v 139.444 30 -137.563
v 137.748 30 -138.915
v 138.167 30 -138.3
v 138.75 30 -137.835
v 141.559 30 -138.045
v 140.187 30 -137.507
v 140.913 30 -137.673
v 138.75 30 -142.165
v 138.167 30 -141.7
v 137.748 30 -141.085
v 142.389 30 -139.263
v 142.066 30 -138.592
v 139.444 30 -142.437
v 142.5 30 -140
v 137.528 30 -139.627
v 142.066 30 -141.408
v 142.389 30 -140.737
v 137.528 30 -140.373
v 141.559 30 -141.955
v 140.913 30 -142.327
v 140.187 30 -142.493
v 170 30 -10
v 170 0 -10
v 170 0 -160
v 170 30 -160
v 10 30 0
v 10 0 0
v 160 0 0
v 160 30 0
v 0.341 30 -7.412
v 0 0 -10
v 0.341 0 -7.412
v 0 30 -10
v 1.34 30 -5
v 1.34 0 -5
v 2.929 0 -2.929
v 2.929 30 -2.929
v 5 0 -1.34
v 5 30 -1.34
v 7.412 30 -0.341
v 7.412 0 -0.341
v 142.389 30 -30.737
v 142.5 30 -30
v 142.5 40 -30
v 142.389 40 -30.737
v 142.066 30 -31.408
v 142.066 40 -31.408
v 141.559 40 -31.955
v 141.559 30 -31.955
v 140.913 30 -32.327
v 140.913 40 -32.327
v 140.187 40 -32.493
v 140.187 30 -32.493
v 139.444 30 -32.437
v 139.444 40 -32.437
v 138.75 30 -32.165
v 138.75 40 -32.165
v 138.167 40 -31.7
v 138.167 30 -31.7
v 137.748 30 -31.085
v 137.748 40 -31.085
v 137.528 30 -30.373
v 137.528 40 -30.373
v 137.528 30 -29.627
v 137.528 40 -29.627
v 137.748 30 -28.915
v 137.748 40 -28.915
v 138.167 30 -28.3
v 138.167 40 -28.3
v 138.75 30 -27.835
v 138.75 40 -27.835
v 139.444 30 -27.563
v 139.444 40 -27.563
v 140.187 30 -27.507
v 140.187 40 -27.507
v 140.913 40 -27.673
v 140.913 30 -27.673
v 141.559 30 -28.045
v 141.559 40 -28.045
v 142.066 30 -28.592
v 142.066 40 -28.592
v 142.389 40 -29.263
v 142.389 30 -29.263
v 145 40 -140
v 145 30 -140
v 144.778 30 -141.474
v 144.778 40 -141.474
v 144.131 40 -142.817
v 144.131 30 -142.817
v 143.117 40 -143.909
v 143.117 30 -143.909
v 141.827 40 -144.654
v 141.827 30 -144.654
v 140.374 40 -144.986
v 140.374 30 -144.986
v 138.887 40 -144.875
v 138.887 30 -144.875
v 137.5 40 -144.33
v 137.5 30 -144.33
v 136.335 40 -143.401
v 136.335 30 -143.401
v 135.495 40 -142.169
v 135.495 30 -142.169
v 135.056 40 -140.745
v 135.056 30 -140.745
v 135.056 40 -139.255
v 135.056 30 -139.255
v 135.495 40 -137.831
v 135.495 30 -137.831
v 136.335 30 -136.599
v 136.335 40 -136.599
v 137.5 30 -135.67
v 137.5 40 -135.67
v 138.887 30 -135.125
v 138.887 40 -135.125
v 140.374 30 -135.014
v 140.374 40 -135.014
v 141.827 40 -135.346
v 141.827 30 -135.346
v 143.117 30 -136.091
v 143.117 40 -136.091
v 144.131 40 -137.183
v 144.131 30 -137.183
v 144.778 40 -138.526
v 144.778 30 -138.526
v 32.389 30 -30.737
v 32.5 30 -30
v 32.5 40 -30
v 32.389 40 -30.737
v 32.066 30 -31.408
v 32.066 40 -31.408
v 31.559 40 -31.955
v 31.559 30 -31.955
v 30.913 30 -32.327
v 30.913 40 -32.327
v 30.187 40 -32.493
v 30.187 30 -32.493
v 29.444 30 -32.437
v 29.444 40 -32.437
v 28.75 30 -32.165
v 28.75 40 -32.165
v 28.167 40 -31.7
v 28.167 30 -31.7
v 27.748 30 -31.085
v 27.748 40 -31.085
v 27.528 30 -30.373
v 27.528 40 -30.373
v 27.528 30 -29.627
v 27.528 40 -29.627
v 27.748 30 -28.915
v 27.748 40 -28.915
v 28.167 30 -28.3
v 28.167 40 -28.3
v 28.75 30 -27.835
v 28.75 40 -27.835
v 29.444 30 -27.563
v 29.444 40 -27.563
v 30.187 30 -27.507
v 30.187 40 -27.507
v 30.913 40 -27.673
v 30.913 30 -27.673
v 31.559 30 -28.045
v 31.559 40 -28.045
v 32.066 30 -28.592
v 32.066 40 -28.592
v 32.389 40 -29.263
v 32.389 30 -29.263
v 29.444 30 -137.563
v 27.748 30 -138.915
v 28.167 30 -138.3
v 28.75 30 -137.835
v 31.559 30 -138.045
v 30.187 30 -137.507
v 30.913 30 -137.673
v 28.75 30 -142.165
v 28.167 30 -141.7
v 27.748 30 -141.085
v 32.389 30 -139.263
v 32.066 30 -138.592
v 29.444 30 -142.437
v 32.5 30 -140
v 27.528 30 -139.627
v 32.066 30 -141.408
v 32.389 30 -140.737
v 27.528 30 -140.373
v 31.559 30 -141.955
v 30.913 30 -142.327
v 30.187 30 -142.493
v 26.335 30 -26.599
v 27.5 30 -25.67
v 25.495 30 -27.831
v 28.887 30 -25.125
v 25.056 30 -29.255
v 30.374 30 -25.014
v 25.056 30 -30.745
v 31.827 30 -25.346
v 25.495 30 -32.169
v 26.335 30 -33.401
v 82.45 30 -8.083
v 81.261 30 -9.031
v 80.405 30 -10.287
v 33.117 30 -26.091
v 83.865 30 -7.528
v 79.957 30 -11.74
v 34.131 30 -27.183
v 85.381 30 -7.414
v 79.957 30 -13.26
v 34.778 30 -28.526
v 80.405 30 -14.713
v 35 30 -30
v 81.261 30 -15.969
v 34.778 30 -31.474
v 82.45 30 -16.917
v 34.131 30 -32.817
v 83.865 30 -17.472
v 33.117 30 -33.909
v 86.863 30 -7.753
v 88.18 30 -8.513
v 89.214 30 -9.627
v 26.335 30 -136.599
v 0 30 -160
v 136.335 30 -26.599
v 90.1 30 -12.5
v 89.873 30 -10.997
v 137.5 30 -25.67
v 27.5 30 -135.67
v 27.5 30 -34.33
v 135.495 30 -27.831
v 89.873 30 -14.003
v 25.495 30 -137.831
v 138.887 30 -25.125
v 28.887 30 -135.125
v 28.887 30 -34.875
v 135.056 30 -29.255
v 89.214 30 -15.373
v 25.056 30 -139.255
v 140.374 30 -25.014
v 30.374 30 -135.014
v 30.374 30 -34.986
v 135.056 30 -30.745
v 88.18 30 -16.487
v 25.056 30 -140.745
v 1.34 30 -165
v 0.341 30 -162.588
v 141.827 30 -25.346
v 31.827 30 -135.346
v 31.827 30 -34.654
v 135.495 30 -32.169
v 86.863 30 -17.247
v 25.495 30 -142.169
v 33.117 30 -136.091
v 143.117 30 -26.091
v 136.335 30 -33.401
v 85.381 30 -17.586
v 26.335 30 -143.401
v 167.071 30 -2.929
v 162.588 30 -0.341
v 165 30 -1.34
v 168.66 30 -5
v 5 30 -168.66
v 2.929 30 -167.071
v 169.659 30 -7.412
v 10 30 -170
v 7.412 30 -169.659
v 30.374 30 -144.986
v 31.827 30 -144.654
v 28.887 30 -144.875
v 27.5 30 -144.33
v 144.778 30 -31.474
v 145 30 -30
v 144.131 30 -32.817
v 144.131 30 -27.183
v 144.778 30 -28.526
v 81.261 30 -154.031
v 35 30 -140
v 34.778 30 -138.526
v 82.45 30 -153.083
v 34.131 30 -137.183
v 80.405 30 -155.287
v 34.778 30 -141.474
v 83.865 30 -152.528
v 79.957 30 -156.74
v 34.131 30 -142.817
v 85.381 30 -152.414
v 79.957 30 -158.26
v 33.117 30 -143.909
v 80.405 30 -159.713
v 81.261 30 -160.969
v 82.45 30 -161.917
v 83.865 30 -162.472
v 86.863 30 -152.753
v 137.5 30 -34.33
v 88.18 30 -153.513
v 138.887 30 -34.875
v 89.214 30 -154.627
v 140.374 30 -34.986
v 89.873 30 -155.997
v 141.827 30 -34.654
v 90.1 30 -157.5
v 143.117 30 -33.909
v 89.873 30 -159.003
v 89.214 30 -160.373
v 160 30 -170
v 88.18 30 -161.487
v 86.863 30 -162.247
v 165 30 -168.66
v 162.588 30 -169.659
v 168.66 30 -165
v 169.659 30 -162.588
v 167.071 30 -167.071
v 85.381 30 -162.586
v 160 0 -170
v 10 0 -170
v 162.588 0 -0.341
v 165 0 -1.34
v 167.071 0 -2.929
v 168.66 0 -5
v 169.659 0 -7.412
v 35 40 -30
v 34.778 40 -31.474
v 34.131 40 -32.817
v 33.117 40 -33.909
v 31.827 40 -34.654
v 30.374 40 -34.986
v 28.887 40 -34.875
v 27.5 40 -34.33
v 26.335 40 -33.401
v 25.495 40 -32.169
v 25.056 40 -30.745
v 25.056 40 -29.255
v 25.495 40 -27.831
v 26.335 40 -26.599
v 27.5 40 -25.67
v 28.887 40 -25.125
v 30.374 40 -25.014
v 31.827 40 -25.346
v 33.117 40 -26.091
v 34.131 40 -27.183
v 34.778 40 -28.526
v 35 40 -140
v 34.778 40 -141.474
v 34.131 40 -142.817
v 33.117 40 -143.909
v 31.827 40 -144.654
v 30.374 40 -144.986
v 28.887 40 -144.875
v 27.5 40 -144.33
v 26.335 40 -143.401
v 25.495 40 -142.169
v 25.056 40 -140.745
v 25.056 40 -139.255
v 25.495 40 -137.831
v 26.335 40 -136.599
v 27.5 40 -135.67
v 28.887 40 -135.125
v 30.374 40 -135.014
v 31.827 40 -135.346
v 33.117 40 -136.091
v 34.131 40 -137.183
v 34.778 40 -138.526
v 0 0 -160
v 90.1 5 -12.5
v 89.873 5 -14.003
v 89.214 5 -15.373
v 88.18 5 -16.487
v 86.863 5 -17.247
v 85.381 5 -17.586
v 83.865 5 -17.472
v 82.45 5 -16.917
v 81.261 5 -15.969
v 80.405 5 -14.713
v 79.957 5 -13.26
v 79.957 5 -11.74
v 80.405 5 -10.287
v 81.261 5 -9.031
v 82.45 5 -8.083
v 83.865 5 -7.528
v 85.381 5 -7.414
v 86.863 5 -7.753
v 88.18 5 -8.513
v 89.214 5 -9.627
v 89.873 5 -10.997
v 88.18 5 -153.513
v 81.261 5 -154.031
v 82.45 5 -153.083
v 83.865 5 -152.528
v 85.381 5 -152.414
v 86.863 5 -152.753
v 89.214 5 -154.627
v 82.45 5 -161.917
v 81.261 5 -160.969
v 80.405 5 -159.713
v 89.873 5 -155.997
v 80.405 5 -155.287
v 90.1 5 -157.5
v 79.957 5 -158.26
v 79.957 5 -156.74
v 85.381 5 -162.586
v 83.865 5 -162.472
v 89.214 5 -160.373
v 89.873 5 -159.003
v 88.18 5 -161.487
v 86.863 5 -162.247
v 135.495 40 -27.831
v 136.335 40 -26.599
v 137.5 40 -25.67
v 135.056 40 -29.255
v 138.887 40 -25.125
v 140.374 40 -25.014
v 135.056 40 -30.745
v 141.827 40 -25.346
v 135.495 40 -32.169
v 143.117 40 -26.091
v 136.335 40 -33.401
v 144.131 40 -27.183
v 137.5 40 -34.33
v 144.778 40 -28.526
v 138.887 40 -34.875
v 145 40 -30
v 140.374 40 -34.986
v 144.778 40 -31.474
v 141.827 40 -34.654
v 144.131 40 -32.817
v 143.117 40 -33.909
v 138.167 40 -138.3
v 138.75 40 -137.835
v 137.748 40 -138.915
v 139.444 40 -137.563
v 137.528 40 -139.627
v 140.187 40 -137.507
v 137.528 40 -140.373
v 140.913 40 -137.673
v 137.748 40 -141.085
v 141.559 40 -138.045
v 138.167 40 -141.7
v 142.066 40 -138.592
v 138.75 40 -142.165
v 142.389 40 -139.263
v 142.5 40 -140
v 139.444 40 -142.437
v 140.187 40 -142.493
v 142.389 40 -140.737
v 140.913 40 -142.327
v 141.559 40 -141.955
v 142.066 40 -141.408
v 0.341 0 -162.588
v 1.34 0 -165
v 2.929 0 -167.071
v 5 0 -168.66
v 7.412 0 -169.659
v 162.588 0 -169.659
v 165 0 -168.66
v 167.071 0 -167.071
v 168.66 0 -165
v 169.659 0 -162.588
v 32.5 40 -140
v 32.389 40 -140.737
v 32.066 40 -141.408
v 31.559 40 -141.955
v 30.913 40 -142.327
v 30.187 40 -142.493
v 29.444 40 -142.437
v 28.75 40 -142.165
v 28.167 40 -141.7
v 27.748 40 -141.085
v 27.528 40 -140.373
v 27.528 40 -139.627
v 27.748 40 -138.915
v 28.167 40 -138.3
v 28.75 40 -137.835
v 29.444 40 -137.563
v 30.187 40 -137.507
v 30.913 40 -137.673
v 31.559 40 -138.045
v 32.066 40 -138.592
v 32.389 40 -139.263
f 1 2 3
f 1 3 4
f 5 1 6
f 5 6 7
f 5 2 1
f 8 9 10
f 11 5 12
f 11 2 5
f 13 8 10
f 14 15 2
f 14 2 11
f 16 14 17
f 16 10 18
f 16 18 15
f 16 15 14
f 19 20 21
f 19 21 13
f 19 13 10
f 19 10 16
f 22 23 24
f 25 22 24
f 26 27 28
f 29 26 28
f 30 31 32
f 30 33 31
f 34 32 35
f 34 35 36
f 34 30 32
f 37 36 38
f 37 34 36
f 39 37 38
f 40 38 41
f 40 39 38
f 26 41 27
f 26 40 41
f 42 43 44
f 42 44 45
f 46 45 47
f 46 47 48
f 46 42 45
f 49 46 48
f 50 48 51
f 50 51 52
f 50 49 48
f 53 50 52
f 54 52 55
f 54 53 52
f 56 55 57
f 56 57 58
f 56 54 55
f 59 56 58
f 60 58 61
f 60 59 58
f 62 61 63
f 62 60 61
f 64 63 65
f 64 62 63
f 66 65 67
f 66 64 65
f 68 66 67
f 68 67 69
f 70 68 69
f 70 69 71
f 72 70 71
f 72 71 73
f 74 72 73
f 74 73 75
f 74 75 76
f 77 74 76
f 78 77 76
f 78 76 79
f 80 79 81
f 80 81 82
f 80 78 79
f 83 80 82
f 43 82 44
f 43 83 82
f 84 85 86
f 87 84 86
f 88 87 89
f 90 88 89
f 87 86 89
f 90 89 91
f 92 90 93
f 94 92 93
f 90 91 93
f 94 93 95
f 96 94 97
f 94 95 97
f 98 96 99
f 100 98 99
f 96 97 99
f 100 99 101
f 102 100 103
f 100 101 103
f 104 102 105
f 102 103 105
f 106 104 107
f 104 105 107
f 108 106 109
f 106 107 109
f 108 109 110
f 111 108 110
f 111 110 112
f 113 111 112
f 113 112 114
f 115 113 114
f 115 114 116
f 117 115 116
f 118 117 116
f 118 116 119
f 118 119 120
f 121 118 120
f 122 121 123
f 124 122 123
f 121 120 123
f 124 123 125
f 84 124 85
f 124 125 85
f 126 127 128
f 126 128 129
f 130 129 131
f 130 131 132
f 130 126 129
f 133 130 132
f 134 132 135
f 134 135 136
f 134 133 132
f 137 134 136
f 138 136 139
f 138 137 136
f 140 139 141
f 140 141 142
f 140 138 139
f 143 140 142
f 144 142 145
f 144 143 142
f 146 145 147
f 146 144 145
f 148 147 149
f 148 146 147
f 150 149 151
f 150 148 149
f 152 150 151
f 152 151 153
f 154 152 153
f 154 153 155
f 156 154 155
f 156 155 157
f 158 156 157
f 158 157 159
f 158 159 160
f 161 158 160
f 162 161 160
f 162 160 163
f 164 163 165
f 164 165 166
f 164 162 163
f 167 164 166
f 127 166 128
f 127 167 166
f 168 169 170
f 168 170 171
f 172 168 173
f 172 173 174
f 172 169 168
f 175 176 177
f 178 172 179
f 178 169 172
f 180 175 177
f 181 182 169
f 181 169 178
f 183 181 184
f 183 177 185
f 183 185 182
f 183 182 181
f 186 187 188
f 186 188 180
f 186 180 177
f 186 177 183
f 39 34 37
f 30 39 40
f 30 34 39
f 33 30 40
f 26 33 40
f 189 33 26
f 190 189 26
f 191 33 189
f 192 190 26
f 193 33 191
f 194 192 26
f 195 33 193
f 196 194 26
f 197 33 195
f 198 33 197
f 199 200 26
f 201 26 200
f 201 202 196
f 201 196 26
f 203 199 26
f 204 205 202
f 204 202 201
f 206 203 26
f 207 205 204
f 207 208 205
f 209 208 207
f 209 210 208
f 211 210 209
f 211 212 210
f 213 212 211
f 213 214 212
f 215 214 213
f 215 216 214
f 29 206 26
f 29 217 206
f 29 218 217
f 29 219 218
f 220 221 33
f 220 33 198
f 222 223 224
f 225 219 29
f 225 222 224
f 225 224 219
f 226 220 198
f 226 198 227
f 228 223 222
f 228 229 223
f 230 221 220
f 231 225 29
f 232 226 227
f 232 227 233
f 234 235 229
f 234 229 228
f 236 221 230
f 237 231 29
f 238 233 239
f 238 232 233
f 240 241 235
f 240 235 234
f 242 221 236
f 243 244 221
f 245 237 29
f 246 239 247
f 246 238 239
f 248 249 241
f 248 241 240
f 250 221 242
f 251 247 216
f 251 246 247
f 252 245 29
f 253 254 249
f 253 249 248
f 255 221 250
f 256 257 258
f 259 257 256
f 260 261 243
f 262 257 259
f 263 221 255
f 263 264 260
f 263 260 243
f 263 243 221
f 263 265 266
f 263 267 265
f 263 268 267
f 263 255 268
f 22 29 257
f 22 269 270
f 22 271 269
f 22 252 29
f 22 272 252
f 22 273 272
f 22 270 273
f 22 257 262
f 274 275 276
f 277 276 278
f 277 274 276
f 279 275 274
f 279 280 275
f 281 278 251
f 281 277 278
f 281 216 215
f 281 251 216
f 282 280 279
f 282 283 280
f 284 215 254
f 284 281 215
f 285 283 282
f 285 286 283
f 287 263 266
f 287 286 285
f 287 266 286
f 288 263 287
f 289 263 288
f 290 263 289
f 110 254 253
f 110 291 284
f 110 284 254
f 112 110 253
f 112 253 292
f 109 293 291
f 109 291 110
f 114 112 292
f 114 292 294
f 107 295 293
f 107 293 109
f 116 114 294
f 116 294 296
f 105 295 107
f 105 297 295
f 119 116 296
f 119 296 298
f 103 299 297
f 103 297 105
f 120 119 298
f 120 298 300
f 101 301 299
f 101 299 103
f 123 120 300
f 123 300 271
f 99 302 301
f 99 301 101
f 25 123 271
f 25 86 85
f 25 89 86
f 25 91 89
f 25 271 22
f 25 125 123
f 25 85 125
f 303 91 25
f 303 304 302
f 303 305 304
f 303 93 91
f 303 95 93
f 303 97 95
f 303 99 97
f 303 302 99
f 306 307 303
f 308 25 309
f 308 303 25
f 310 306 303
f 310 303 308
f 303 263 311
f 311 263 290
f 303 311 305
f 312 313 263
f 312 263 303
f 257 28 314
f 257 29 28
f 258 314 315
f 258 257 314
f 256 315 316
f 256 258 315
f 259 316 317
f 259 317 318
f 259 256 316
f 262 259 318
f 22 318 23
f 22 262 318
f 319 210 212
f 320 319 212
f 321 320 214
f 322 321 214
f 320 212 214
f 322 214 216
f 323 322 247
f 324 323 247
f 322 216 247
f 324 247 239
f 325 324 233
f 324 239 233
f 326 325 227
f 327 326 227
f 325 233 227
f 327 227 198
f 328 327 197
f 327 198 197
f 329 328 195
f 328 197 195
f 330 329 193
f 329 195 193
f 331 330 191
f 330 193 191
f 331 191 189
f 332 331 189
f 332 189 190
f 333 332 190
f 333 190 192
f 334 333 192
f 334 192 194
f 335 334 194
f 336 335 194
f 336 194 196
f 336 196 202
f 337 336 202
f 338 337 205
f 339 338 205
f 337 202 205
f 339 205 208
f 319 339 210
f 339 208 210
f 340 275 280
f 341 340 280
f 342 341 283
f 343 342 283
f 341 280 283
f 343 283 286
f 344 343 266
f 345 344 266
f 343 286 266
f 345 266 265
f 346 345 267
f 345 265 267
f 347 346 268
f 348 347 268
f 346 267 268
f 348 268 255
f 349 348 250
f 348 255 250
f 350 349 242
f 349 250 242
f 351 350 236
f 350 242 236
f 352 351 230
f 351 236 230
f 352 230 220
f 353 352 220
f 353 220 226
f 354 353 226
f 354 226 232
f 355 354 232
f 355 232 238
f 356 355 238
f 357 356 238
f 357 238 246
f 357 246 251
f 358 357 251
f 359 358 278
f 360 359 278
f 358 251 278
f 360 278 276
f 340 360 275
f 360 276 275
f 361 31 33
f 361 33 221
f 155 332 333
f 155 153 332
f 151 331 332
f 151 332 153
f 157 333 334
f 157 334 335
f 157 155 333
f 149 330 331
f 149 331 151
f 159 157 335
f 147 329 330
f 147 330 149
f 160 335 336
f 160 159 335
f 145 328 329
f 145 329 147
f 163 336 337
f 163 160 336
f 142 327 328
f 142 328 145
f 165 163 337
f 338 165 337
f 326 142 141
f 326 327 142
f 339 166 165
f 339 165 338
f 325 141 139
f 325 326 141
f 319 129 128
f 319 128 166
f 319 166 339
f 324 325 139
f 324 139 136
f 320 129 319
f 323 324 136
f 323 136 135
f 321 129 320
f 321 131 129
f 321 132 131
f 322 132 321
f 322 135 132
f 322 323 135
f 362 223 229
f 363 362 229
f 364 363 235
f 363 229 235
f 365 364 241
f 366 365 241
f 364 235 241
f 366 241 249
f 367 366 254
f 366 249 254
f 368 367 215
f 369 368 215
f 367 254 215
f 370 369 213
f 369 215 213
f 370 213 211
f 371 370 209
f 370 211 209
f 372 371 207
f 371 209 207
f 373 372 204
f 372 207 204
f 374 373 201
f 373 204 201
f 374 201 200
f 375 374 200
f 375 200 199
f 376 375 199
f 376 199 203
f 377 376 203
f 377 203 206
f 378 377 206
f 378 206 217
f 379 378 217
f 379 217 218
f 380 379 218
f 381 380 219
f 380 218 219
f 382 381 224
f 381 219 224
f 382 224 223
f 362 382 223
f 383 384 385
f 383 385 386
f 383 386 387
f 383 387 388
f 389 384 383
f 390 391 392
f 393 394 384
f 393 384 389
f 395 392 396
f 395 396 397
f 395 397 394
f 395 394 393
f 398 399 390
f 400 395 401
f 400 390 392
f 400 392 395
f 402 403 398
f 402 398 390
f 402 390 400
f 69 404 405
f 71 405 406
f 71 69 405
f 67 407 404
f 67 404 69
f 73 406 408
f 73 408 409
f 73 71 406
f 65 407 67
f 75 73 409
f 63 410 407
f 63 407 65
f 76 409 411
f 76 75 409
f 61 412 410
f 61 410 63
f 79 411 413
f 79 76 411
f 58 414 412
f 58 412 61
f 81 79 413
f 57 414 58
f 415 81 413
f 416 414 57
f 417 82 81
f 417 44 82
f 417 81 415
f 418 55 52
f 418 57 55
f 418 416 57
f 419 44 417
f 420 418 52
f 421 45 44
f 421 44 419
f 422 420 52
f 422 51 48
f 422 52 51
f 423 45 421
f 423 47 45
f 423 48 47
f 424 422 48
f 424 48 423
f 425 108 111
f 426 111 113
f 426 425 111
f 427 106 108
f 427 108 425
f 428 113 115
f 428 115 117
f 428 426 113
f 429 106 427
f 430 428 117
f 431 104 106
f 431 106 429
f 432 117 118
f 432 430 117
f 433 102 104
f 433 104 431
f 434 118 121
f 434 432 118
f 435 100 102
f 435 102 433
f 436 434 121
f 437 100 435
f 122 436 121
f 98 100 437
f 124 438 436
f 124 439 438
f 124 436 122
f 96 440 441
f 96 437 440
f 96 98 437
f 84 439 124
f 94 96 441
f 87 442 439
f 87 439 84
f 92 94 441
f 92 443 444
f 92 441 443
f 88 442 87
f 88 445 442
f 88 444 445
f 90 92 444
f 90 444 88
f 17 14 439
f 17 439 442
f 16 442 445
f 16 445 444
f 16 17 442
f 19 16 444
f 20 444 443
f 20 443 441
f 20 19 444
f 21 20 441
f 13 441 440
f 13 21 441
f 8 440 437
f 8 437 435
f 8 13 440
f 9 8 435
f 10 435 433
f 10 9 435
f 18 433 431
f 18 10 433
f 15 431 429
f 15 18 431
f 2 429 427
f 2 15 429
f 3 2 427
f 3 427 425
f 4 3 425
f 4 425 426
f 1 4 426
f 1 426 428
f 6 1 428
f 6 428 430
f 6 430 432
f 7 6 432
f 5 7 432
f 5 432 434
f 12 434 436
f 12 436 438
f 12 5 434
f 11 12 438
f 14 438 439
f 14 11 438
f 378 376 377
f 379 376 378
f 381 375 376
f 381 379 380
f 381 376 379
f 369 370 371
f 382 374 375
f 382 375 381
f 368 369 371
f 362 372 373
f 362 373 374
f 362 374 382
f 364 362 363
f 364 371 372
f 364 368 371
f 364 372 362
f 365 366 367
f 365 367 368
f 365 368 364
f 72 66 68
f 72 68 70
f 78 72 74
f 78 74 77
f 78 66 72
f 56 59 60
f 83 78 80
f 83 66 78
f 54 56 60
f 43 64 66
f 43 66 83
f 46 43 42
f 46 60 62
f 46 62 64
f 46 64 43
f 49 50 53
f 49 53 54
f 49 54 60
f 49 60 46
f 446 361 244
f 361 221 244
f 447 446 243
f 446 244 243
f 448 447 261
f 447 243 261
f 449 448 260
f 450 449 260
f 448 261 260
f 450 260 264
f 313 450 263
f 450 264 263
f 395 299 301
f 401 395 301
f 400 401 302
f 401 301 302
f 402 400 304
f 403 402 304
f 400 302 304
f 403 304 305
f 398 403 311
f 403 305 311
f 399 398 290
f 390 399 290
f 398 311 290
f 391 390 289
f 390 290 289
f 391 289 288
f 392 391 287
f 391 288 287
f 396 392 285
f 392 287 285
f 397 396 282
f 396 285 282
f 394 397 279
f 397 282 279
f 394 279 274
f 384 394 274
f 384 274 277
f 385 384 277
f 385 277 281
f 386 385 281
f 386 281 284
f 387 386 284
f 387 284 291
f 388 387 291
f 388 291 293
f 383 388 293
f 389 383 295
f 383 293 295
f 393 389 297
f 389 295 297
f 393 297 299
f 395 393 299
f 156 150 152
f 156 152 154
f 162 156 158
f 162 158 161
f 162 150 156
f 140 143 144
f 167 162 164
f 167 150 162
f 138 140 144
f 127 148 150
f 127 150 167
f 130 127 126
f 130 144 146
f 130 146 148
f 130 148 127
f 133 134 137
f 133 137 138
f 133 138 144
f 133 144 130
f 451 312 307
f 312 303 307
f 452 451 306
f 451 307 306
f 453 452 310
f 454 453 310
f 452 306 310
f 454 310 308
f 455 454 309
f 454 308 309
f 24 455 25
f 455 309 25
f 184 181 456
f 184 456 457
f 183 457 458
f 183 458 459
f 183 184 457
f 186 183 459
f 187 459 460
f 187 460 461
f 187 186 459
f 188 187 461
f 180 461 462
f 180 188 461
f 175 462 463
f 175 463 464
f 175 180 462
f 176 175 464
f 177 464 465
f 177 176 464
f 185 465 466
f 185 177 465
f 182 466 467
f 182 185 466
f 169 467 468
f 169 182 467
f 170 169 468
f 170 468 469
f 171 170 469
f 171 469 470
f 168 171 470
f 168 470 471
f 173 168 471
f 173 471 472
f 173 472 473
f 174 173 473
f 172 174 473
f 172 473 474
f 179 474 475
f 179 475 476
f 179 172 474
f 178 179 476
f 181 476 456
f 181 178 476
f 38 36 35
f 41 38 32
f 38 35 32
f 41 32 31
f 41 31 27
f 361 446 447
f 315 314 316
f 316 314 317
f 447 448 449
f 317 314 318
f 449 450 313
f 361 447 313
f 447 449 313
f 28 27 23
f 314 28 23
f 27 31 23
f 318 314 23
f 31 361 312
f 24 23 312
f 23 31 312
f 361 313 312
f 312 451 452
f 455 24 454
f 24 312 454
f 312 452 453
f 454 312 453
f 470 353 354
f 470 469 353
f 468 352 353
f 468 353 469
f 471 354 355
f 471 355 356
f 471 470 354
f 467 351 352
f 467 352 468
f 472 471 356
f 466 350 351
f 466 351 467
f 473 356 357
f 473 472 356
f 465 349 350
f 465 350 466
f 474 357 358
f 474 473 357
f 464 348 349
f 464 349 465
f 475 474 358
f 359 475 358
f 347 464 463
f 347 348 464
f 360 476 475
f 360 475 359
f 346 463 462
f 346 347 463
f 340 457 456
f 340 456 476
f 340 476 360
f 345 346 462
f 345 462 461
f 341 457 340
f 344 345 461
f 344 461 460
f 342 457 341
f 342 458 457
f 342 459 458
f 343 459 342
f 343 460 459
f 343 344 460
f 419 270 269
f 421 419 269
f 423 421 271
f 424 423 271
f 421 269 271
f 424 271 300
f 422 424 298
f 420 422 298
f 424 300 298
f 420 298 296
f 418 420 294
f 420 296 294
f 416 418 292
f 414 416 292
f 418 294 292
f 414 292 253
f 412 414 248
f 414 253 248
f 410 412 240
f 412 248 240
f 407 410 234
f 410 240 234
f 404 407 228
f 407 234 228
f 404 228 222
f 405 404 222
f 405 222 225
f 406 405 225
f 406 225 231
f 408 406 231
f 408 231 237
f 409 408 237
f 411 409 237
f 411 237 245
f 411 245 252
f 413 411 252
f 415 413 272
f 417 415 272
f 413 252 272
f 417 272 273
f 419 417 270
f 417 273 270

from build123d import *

# Parameters (mm, degrees)
SKETCH1_W           = 170
SKETCH1_H           = 170
BOSS_EXTRUDE2_DEPTH = 30
SKETCH2_R           = 5.1
CUT_EXTRUDE1_DEPTH  = 25
SKETCH3_R           = 5
SKETCH3_R_2         = 2.5
BOSS_EXTRUDE3_DEPTH = 10
FILLET1_R           = 10


with BuildPart() as part:
    # Sketch1 → Boss-Extrude2 (new body)
    with BuildSketch(Plane(origin=(0, 0, 0), x_dir=(1, 0, 0), z_dir=(0, 1, 0))):
        with Locations((85, 85)):
            Rectangle(SKETCH1_W, SKETCH1_H)
    extrude(amount=BOSS_EXTRUDE2_DEPTH)

    # Sketch2 → Cut-Extrude1 (cut)
    with BuildSketch(Plane(origin=(0, 30, 0), x_dir=(1, 0, 0), z_dir=(0, 1, 0))):
        with Locations((85, 12.5)):
            Circle(SKETCH2_R)
        with Locations((85, 157.5)):
            Circle(SKETCH2_R)
    extrude(amount=-CUT_EXTRUDE1_DEPTH, mode=Mode.SUBTRACT)

    # Sketch3 → Boss-Extrude3 (add)
    with BuildSketch(Plane(origin=(0, 30, 0), x_dir=(1, 0, 0), z_dir=(0, 1, 0))):
        with Locations((30, 30)):
            Circle(SKETCH3_R)
        with Locations((30, 30)):
            Circle(SKETCH3_R_2, mode=Mode.SUBTRACT)
        with Locations((140, 30)):
            Circle(SKETCH3_R)
        with Locations((140, 30)):
            Circle(SKETCH3_R_2, mode=Mode.SUBTRACT)
        with Locations((30, 140)):
            Circle(SKETCH3_R)
        with Locations((30, 140)):
            Circle(SKETCH3_R_2, mode=Mode.SUBTRACT)
        with Locations((140, 140)):
            Circle(SKETCH3_R)
        with Locations((140, 140)):
            Circle(SKETCH3_R_2, mode=Mode.SUBTRACT)
    extrude(amount=BOSS_EXTRUDE3_DEPTH)

    # Fillet1
    fillet1_edges = [part.edges().sort_by_distance(p)[0] for p in [
        (0, 15, -170),
        (170, 15, -170),
        (170, 15, 0),
        (0, 15, 0),
    ]]
    fillet(fillet1_edges, radius=FILLET1_R)


solid = part.part
